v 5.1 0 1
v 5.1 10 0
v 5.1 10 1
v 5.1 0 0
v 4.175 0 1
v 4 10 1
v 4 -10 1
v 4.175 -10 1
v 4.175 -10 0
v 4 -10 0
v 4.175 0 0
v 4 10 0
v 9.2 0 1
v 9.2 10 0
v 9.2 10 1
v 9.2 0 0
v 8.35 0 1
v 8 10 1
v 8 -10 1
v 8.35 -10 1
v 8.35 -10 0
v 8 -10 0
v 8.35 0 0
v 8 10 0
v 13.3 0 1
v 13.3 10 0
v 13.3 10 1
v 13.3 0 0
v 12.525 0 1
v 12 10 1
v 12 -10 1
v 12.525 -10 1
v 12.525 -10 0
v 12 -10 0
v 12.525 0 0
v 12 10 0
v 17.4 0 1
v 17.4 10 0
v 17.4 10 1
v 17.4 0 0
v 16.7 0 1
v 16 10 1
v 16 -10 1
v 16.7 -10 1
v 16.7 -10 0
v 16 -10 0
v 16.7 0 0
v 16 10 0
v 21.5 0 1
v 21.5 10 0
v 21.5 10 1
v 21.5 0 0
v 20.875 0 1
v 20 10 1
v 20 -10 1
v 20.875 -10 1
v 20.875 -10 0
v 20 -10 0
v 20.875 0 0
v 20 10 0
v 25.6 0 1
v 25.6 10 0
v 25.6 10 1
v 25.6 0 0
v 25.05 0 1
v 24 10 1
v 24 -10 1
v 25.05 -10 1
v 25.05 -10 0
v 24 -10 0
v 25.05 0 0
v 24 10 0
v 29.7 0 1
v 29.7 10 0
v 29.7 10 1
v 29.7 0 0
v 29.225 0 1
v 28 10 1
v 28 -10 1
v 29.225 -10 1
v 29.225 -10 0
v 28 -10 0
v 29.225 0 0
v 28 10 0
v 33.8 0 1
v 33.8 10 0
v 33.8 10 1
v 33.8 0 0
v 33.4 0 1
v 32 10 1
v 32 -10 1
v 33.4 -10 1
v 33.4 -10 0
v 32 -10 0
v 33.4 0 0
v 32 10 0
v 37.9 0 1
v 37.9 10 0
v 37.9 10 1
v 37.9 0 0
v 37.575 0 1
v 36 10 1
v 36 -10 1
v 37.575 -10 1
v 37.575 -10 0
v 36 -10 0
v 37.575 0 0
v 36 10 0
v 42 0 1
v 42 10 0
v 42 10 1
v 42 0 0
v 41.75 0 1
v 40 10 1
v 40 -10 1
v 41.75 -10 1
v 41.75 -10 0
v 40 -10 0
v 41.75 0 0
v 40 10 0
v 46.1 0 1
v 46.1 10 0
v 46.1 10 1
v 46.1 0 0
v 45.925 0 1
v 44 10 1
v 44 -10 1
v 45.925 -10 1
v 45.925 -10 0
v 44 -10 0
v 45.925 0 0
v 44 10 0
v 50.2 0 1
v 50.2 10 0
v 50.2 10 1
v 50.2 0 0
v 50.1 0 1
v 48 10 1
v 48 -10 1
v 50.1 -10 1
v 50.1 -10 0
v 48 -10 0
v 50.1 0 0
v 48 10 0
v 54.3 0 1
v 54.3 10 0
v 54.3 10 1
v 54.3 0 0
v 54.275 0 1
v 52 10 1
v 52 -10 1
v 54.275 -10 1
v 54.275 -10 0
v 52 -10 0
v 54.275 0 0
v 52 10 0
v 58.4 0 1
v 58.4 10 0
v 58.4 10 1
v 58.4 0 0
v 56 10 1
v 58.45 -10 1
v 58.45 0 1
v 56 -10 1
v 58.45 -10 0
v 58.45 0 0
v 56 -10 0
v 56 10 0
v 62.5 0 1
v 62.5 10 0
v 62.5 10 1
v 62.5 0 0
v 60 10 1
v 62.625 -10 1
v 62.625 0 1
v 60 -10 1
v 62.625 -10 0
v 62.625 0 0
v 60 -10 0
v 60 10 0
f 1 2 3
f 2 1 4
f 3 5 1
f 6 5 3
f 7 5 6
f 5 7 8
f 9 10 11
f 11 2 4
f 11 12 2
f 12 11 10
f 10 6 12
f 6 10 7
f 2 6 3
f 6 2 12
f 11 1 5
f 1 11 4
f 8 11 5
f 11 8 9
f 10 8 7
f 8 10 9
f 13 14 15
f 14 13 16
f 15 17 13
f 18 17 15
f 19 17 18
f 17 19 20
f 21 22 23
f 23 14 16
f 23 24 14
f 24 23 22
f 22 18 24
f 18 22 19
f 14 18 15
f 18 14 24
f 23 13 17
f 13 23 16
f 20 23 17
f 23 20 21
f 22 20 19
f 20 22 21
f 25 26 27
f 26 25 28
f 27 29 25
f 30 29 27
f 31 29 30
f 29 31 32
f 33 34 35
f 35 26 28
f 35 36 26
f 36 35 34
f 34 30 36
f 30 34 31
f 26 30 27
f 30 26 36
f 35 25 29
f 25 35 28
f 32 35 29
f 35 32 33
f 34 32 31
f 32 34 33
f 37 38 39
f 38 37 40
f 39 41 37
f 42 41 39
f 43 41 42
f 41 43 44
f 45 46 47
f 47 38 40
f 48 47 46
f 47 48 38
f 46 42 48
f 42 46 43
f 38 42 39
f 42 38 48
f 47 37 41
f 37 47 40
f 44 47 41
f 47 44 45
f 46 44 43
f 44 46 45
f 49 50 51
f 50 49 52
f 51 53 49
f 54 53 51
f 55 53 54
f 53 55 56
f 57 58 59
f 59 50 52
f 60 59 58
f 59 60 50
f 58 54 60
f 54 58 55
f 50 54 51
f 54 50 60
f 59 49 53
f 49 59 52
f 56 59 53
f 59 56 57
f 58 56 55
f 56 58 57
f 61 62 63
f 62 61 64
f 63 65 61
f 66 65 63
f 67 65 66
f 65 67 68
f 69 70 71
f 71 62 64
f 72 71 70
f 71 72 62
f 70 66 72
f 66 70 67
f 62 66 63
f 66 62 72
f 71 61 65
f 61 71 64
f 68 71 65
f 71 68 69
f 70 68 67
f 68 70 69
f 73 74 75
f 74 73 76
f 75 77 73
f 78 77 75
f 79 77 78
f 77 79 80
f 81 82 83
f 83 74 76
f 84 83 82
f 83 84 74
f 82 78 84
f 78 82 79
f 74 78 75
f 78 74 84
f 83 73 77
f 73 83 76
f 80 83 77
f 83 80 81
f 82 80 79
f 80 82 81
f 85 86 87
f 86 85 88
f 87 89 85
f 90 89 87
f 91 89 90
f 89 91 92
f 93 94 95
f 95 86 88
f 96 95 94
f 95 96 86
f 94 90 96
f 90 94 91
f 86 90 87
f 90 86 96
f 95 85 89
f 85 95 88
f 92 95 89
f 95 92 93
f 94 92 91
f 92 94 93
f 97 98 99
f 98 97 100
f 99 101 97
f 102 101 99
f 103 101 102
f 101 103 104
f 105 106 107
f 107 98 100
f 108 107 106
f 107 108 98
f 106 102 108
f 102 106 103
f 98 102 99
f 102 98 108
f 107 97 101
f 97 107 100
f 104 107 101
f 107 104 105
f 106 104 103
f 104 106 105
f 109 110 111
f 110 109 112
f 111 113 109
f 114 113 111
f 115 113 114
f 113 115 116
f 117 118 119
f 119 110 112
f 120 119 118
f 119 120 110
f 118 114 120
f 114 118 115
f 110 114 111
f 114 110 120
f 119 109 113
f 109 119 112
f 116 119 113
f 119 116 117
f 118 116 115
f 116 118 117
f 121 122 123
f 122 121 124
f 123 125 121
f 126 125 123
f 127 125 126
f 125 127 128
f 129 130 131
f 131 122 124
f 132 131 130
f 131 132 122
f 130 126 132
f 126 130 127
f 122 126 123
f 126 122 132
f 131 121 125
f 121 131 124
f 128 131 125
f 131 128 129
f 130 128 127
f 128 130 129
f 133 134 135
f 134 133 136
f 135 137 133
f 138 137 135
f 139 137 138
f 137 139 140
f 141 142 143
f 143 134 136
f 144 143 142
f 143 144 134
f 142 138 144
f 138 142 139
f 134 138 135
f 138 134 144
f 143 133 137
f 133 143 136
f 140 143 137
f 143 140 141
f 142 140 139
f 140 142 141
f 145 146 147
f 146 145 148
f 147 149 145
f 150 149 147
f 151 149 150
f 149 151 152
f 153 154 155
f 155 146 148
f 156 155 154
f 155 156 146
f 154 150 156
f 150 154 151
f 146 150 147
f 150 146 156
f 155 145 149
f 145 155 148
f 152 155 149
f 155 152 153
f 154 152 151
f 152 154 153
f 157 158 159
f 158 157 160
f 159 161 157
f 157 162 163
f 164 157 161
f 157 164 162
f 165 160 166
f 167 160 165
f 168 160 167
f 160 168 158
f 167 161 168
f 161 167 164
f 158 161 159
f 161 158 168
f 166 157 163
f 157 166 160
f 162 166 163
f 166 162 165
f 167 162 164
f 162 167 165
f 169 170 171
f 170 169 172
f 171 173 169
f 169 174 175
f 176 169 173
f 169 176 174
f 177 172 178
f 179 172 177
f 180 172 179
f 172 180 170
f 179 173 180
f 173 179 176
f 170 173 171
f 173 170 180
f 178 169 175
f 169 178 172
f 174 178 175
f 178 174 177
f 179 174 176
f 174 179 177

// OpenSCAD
NozzleW = 0.35 / 2;


union() {
	for (step = [1:15]) {
		translate([step * 4, 0, 0])
			cube([1 + (step * 0.1), 10, 1]);
	
		translate([step * 4, -10, 0])
			cube([step * NozzleW, 10, 1]);
	
	}
}
